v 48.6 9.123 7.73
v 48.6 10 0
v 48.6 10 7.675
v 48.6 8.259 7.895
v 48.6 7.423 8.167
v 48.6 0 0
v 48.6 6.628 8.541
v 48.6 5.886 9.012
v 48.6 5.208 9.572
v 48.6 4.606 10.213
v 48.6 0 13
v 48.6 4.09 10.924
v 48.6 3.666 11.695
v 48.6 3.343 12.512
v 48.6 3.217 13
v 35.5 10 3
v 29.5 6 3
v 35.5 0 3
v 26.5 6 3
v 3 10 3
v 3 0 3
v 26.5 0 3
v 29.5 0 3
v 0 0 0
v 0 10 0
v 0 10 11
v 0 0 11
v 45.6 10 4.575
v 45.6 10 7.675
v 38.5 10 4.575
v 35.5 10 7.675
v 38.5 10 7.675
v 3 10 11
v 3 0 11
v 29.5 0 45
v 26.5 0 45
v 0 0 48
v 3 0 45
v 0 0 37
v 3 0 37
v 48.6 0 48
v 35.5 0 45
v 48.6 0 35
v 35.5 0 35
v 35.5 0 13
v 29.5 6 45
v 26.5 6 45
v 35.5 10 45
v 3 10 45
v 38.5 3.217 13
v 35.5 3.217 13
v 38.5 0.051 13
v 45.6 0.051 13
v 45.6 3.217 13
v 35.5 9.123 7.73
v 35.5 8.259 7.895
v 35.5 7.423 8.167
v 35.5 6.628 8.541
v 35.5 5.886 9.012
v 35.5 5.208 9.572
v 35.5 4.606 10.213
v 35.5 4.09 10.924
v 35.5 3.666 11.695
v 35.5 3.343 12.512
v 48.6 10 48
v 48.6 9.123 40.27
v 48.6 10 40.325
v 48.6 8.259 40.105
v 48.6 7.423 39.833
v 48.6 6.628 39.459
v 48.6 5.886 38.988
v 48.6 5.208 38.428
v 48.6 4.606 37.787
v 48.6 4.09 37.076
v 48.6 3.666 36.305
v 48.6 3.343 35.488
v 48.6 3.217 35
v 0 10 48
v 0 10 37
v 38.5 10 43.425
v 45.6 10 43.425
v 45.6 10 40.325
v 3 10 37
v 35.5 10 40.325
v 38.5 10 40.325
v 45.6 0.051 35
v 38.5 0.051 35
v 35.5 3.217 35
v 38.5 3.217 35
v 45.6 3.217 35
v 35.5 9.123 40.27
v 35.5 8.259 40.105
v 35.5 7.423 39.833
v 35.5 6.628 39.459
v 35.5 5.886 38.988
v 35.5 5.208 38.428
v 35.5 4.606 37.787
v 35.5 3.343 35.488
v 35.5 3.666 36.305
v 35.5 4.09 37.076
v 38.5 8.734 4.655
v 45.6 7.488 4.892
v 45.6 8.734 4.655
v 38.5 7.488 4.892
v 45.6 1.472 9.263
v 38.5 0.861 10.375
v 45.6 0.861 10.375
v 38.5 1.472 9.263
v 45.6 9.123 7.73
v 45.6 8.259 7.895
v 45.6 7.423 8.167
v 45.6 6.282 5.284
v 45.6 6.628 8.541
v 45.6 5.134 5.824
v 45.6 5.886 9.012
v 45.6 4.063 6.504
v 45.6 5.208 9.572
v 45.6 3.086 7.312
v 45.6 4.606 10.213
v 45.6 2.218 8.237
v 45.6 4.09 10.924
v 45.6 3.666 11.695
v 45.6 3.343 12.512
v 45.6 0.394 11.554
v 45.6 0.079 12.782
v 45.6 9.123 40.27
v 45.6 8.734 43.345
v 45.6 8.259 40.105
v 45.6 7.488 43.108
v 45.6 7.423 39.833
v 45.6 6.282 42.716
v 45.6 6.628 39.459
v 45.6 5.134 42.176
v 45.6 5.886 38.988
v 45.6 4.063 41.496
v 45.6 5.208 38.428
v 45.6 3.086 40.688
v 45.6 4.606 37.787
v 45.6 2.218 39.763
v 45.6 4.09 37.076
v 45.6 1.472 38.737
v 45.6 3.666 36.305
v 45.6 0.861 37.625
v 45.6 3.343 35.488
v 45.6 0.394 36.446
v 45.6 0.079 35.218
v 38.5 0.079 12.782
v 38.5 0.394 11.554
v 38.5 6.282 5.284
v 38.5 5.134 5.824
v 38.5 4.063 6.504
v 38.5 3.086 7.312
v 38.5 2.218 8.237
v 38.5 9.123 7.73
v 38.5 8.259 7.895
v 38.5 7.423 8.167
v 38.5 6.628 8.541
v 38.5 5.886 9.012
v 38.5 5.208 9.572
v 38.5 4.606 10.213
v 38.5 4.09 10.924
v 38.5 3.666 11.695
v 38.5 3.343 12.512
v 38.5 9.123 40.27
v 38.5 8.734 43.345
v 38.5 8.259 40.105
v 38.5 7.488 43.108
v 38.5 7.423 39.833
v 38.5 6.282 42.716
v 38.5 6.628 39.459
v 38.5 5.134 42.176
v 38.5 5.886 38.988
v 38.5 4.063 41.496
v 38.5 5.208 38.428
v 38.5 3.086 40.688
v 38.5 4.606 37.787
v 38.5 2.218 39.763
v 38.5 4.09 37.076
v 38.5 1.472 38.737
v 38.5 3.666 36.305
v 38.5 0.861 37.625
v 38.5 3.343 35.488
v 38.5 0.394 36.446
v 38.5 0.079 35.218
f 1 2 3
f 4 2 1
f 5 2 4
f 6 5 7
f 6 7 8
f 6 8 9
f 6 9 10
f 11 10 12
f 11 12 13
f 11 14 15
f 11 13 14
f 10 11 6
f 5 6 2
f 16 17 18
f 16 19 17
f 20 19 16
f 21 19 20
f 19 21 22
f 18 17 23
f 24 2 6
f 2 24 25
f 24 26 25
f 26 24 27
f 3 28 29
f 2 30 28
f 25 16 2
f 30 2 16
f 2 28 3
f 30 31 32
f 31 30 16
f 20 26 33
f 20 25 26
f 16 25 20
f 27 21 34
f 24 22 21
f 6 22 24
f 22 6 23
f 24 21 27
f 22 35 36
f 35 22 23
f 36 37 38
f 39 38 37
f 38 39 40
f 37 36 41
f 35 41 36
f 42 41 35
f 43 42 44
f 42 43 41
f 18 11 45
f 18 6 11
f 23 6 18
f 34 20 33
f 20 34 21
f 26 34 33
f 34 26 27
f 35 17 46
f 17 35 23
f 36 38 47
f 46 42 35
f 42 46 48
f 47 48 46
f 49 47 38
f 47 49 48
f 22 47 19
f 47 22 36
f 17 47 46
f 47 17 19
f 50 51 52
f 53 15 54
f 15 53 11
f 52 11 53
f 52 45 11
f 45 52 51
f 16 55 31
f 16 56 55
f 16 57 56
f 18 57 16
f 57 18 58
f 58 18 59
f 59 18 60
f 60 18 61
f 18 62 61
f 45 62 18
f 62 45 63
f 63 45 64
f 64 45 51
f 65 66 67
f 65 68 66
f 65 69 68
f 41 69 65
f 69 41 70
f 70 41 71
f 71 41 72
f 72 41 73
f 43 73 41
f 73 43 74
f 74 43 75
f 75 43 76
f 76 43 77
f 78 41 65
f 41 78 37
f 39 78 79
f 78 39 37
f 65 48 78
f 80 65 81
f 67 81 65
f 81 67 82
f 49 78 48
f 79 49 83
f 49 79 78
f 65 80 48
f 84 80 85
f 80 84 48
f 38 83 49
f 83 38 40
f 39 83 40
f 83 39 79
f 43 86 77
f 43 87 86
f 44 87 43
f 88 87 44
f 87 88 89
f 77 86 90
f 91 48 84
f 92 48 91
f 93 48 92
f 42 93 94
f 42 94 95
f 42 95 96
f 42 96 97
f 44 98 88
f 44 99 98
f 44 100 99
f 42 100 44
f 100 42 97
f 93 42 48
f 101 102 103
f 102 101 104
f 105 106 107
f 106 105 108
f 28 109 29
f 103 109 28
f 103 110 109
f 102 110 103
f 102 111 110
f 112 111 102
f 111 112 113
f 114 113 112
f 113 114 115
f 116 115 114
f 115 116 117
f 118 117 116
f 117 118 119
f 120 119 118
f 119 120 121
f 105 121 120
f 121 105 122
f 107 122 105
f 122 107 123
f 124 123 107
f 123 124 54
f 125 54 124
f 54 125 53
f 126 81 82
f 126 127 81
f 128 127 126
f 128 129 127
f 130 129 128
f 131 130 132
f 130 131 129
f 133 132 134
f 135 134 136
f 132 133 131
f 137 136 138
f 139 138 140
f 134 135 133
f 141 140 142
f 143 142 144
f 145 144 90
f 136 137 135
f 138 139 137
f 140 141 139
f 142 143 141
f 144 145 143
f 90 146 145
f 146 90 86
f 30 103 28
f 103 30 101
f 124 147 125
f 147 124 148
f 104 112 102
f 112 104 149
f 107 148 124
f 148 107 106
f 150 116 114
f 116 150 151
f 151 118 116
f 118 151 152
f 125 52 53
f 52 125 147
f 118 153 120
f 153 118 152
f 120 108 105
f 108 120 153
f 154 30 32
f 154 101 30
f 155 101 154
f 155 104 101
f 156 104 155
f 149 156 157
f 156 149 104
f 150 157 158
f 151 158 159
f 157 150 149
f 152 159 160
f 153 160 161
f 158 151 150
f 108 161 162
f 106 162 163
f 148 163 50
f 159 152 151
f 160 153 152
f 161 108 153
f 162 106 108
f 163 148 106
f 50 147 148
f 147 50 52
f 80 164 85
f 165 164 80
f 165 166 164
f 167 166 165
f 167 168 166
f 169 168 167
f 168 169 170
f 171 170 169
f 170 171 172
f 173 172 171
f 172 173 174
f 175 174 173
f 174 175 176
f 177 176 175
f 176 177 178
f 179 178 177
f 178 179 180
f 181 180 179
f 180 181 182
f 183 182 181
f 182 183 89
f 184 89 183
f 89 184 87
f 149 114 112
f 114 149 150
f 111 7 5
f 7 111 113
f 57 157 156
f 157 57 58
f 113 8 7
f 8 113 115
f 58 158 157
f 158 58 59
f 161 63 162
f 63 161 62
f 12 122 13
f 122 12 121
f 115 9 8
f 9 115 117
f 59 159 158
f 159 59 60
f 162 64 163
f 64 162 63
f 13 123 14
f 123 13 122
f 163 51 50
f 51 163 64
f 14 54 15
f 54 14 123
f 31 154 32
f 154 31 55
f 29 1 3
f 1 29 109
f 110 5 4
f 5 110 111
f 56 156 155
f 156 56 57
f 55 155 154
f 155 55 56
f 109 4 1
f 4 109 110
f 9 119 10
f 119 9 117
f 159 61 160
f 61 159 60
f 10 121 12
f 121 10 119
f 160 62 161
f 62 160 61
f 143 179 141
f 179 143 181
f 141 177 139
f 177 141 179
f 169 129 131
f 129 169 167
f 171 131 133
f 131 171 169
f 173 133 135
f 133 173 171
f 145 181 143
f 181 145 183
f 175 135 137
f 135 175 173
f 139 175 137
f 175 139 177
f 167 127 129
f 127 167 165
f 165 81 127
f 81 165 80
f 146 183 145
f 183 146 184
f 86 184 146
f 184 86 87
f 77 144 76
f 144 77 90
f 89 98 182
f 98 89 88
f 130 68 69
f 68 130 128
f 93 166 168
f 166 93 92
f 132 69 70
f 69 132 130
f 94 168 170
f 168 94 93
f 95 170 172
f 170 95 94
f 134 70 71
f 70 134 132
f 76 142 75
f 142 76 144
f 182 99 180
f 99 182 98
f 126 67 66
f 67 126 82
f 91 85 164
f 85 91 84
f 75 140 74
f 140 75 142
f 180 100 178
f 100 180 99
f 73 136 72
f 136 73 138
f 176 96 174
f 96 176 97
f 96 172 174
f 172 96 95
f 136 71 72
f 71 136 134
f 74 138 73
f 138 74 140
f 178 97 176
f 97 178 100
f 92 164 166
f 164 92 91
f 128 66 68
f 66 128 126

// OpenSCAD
// polarizer holder
// 2 needed

case_thickness = 23.5;  // case sandwich thickness
case_height = 42;

polarz_distance = 12;   // face-to-inside of polarizer
polarz_thickness = 7.1; // frame thickness
polarz_radius = 10;     // corner radius
polarz_block_height = polarz_radius + 0;
polarz_height = 38.25 + 0.2;

polarz_center_adj = (case_height - (polarz_height + 0.2))/2;

backbone_width = 10;
backbone_thickness = 3;

clamp_height = 8;
clamp_thickness = 3;    // thickness of each finger clamp

// total length
backbone_length = clamp_thickness + 
    case_thickness +
    polarz_distance +
    polarz_thickness +
    clamp_thickness;

pb_thickness = clamp_thickness + polarz_thickness + clamp_thickness;
// pb_x = translate distance
//      = subtract the last clamp thickness because it's the inside dist
pb_x = clamp_thickness + case_thickness + polarz_distance - clamp_thickness;

// overall
// difference(parts, polarizer)
$fn = 50;

difference () {
    union () {
        // bottom backbone    
        cube([backbone_length, backbone_width, backbone_thickness],
            center=false
            );
            
        // 1st vertical - behind case
        translate([0,0,backbone_thickness])
            cube([clamp_thickness, backbone_width, clamp_height], 
                center=false
                );
                
        // 2nd veritical - front of case
        translate([clamp_thickness + case_thickness, 0, backbone_thickness])
            cube([clamp_thickness, 
                backbone_width - 4, 
                case_height],
                center=false
                );
                
        // polarz block


        translate([pb_x, 0, backbone_thickness])
            cube([pb_thickness, backbone_width, polarz_block_height],
                center=false
                );
                
        // top backbone
        translate([0,0,backbone_thickness + case_height])
            cube([backbone_length, backbone_width, backbone_thickness],
                center=false
            );
        // 1st vertical - behind case
        translate([0,0,backbone_thickness + case_height - clamp_height])
            cube([clamp_thickness, backbone_width, clamp_height], 
                center=false
                );
        translate([pb_x, 0, 
            backbone_thickness + case_height -polarz_block_height])
            cube([pb_thickness, backbone_width, polarz_block_height],
                center=false
                );
    }
    // subtract the polarizer
    
    union () {
        translate([pb_x + clamp_thickness,
            polarz_radius,
            polarz_radius + backbone_thickness +
            polarz_center_adj
            ])
        rotate([0,90,0])
            cylinder(r = polarz_radius + 0.1, h = polarz_thickness, 
                center = false);
        // larger radius
        translate([pb_x,
            polarz_radius,
            polarz_radius + 3 +
            polarz_center_adj
            ])
        rotate([0,90,0])
            cylinder(r = polarz_radius - 3, h = polarz_thickness + 6, 
                center = false);
        
        // top 
        translate([pb_x + clamp_thickness,
            polarz_radius,
            (backbone_thickness + case_height) - 
            (polarz_radius + polarz_center_adj)])
        rotate([0,90,0])
            cylinder(r = polarz_radius + 0.1, h = polarz_thickness, 
                center = false);
        
        translate([pb_x,
            polarz_radius,
            (backbone_thickness + case_height) - 
            (polarz_radius + polarz_center_adj)])
        rotate([0,90,0])
            cylinder(r = polarz_radius - 3, h = polarz_thickness + 6, 
                center = false);
    }

}
